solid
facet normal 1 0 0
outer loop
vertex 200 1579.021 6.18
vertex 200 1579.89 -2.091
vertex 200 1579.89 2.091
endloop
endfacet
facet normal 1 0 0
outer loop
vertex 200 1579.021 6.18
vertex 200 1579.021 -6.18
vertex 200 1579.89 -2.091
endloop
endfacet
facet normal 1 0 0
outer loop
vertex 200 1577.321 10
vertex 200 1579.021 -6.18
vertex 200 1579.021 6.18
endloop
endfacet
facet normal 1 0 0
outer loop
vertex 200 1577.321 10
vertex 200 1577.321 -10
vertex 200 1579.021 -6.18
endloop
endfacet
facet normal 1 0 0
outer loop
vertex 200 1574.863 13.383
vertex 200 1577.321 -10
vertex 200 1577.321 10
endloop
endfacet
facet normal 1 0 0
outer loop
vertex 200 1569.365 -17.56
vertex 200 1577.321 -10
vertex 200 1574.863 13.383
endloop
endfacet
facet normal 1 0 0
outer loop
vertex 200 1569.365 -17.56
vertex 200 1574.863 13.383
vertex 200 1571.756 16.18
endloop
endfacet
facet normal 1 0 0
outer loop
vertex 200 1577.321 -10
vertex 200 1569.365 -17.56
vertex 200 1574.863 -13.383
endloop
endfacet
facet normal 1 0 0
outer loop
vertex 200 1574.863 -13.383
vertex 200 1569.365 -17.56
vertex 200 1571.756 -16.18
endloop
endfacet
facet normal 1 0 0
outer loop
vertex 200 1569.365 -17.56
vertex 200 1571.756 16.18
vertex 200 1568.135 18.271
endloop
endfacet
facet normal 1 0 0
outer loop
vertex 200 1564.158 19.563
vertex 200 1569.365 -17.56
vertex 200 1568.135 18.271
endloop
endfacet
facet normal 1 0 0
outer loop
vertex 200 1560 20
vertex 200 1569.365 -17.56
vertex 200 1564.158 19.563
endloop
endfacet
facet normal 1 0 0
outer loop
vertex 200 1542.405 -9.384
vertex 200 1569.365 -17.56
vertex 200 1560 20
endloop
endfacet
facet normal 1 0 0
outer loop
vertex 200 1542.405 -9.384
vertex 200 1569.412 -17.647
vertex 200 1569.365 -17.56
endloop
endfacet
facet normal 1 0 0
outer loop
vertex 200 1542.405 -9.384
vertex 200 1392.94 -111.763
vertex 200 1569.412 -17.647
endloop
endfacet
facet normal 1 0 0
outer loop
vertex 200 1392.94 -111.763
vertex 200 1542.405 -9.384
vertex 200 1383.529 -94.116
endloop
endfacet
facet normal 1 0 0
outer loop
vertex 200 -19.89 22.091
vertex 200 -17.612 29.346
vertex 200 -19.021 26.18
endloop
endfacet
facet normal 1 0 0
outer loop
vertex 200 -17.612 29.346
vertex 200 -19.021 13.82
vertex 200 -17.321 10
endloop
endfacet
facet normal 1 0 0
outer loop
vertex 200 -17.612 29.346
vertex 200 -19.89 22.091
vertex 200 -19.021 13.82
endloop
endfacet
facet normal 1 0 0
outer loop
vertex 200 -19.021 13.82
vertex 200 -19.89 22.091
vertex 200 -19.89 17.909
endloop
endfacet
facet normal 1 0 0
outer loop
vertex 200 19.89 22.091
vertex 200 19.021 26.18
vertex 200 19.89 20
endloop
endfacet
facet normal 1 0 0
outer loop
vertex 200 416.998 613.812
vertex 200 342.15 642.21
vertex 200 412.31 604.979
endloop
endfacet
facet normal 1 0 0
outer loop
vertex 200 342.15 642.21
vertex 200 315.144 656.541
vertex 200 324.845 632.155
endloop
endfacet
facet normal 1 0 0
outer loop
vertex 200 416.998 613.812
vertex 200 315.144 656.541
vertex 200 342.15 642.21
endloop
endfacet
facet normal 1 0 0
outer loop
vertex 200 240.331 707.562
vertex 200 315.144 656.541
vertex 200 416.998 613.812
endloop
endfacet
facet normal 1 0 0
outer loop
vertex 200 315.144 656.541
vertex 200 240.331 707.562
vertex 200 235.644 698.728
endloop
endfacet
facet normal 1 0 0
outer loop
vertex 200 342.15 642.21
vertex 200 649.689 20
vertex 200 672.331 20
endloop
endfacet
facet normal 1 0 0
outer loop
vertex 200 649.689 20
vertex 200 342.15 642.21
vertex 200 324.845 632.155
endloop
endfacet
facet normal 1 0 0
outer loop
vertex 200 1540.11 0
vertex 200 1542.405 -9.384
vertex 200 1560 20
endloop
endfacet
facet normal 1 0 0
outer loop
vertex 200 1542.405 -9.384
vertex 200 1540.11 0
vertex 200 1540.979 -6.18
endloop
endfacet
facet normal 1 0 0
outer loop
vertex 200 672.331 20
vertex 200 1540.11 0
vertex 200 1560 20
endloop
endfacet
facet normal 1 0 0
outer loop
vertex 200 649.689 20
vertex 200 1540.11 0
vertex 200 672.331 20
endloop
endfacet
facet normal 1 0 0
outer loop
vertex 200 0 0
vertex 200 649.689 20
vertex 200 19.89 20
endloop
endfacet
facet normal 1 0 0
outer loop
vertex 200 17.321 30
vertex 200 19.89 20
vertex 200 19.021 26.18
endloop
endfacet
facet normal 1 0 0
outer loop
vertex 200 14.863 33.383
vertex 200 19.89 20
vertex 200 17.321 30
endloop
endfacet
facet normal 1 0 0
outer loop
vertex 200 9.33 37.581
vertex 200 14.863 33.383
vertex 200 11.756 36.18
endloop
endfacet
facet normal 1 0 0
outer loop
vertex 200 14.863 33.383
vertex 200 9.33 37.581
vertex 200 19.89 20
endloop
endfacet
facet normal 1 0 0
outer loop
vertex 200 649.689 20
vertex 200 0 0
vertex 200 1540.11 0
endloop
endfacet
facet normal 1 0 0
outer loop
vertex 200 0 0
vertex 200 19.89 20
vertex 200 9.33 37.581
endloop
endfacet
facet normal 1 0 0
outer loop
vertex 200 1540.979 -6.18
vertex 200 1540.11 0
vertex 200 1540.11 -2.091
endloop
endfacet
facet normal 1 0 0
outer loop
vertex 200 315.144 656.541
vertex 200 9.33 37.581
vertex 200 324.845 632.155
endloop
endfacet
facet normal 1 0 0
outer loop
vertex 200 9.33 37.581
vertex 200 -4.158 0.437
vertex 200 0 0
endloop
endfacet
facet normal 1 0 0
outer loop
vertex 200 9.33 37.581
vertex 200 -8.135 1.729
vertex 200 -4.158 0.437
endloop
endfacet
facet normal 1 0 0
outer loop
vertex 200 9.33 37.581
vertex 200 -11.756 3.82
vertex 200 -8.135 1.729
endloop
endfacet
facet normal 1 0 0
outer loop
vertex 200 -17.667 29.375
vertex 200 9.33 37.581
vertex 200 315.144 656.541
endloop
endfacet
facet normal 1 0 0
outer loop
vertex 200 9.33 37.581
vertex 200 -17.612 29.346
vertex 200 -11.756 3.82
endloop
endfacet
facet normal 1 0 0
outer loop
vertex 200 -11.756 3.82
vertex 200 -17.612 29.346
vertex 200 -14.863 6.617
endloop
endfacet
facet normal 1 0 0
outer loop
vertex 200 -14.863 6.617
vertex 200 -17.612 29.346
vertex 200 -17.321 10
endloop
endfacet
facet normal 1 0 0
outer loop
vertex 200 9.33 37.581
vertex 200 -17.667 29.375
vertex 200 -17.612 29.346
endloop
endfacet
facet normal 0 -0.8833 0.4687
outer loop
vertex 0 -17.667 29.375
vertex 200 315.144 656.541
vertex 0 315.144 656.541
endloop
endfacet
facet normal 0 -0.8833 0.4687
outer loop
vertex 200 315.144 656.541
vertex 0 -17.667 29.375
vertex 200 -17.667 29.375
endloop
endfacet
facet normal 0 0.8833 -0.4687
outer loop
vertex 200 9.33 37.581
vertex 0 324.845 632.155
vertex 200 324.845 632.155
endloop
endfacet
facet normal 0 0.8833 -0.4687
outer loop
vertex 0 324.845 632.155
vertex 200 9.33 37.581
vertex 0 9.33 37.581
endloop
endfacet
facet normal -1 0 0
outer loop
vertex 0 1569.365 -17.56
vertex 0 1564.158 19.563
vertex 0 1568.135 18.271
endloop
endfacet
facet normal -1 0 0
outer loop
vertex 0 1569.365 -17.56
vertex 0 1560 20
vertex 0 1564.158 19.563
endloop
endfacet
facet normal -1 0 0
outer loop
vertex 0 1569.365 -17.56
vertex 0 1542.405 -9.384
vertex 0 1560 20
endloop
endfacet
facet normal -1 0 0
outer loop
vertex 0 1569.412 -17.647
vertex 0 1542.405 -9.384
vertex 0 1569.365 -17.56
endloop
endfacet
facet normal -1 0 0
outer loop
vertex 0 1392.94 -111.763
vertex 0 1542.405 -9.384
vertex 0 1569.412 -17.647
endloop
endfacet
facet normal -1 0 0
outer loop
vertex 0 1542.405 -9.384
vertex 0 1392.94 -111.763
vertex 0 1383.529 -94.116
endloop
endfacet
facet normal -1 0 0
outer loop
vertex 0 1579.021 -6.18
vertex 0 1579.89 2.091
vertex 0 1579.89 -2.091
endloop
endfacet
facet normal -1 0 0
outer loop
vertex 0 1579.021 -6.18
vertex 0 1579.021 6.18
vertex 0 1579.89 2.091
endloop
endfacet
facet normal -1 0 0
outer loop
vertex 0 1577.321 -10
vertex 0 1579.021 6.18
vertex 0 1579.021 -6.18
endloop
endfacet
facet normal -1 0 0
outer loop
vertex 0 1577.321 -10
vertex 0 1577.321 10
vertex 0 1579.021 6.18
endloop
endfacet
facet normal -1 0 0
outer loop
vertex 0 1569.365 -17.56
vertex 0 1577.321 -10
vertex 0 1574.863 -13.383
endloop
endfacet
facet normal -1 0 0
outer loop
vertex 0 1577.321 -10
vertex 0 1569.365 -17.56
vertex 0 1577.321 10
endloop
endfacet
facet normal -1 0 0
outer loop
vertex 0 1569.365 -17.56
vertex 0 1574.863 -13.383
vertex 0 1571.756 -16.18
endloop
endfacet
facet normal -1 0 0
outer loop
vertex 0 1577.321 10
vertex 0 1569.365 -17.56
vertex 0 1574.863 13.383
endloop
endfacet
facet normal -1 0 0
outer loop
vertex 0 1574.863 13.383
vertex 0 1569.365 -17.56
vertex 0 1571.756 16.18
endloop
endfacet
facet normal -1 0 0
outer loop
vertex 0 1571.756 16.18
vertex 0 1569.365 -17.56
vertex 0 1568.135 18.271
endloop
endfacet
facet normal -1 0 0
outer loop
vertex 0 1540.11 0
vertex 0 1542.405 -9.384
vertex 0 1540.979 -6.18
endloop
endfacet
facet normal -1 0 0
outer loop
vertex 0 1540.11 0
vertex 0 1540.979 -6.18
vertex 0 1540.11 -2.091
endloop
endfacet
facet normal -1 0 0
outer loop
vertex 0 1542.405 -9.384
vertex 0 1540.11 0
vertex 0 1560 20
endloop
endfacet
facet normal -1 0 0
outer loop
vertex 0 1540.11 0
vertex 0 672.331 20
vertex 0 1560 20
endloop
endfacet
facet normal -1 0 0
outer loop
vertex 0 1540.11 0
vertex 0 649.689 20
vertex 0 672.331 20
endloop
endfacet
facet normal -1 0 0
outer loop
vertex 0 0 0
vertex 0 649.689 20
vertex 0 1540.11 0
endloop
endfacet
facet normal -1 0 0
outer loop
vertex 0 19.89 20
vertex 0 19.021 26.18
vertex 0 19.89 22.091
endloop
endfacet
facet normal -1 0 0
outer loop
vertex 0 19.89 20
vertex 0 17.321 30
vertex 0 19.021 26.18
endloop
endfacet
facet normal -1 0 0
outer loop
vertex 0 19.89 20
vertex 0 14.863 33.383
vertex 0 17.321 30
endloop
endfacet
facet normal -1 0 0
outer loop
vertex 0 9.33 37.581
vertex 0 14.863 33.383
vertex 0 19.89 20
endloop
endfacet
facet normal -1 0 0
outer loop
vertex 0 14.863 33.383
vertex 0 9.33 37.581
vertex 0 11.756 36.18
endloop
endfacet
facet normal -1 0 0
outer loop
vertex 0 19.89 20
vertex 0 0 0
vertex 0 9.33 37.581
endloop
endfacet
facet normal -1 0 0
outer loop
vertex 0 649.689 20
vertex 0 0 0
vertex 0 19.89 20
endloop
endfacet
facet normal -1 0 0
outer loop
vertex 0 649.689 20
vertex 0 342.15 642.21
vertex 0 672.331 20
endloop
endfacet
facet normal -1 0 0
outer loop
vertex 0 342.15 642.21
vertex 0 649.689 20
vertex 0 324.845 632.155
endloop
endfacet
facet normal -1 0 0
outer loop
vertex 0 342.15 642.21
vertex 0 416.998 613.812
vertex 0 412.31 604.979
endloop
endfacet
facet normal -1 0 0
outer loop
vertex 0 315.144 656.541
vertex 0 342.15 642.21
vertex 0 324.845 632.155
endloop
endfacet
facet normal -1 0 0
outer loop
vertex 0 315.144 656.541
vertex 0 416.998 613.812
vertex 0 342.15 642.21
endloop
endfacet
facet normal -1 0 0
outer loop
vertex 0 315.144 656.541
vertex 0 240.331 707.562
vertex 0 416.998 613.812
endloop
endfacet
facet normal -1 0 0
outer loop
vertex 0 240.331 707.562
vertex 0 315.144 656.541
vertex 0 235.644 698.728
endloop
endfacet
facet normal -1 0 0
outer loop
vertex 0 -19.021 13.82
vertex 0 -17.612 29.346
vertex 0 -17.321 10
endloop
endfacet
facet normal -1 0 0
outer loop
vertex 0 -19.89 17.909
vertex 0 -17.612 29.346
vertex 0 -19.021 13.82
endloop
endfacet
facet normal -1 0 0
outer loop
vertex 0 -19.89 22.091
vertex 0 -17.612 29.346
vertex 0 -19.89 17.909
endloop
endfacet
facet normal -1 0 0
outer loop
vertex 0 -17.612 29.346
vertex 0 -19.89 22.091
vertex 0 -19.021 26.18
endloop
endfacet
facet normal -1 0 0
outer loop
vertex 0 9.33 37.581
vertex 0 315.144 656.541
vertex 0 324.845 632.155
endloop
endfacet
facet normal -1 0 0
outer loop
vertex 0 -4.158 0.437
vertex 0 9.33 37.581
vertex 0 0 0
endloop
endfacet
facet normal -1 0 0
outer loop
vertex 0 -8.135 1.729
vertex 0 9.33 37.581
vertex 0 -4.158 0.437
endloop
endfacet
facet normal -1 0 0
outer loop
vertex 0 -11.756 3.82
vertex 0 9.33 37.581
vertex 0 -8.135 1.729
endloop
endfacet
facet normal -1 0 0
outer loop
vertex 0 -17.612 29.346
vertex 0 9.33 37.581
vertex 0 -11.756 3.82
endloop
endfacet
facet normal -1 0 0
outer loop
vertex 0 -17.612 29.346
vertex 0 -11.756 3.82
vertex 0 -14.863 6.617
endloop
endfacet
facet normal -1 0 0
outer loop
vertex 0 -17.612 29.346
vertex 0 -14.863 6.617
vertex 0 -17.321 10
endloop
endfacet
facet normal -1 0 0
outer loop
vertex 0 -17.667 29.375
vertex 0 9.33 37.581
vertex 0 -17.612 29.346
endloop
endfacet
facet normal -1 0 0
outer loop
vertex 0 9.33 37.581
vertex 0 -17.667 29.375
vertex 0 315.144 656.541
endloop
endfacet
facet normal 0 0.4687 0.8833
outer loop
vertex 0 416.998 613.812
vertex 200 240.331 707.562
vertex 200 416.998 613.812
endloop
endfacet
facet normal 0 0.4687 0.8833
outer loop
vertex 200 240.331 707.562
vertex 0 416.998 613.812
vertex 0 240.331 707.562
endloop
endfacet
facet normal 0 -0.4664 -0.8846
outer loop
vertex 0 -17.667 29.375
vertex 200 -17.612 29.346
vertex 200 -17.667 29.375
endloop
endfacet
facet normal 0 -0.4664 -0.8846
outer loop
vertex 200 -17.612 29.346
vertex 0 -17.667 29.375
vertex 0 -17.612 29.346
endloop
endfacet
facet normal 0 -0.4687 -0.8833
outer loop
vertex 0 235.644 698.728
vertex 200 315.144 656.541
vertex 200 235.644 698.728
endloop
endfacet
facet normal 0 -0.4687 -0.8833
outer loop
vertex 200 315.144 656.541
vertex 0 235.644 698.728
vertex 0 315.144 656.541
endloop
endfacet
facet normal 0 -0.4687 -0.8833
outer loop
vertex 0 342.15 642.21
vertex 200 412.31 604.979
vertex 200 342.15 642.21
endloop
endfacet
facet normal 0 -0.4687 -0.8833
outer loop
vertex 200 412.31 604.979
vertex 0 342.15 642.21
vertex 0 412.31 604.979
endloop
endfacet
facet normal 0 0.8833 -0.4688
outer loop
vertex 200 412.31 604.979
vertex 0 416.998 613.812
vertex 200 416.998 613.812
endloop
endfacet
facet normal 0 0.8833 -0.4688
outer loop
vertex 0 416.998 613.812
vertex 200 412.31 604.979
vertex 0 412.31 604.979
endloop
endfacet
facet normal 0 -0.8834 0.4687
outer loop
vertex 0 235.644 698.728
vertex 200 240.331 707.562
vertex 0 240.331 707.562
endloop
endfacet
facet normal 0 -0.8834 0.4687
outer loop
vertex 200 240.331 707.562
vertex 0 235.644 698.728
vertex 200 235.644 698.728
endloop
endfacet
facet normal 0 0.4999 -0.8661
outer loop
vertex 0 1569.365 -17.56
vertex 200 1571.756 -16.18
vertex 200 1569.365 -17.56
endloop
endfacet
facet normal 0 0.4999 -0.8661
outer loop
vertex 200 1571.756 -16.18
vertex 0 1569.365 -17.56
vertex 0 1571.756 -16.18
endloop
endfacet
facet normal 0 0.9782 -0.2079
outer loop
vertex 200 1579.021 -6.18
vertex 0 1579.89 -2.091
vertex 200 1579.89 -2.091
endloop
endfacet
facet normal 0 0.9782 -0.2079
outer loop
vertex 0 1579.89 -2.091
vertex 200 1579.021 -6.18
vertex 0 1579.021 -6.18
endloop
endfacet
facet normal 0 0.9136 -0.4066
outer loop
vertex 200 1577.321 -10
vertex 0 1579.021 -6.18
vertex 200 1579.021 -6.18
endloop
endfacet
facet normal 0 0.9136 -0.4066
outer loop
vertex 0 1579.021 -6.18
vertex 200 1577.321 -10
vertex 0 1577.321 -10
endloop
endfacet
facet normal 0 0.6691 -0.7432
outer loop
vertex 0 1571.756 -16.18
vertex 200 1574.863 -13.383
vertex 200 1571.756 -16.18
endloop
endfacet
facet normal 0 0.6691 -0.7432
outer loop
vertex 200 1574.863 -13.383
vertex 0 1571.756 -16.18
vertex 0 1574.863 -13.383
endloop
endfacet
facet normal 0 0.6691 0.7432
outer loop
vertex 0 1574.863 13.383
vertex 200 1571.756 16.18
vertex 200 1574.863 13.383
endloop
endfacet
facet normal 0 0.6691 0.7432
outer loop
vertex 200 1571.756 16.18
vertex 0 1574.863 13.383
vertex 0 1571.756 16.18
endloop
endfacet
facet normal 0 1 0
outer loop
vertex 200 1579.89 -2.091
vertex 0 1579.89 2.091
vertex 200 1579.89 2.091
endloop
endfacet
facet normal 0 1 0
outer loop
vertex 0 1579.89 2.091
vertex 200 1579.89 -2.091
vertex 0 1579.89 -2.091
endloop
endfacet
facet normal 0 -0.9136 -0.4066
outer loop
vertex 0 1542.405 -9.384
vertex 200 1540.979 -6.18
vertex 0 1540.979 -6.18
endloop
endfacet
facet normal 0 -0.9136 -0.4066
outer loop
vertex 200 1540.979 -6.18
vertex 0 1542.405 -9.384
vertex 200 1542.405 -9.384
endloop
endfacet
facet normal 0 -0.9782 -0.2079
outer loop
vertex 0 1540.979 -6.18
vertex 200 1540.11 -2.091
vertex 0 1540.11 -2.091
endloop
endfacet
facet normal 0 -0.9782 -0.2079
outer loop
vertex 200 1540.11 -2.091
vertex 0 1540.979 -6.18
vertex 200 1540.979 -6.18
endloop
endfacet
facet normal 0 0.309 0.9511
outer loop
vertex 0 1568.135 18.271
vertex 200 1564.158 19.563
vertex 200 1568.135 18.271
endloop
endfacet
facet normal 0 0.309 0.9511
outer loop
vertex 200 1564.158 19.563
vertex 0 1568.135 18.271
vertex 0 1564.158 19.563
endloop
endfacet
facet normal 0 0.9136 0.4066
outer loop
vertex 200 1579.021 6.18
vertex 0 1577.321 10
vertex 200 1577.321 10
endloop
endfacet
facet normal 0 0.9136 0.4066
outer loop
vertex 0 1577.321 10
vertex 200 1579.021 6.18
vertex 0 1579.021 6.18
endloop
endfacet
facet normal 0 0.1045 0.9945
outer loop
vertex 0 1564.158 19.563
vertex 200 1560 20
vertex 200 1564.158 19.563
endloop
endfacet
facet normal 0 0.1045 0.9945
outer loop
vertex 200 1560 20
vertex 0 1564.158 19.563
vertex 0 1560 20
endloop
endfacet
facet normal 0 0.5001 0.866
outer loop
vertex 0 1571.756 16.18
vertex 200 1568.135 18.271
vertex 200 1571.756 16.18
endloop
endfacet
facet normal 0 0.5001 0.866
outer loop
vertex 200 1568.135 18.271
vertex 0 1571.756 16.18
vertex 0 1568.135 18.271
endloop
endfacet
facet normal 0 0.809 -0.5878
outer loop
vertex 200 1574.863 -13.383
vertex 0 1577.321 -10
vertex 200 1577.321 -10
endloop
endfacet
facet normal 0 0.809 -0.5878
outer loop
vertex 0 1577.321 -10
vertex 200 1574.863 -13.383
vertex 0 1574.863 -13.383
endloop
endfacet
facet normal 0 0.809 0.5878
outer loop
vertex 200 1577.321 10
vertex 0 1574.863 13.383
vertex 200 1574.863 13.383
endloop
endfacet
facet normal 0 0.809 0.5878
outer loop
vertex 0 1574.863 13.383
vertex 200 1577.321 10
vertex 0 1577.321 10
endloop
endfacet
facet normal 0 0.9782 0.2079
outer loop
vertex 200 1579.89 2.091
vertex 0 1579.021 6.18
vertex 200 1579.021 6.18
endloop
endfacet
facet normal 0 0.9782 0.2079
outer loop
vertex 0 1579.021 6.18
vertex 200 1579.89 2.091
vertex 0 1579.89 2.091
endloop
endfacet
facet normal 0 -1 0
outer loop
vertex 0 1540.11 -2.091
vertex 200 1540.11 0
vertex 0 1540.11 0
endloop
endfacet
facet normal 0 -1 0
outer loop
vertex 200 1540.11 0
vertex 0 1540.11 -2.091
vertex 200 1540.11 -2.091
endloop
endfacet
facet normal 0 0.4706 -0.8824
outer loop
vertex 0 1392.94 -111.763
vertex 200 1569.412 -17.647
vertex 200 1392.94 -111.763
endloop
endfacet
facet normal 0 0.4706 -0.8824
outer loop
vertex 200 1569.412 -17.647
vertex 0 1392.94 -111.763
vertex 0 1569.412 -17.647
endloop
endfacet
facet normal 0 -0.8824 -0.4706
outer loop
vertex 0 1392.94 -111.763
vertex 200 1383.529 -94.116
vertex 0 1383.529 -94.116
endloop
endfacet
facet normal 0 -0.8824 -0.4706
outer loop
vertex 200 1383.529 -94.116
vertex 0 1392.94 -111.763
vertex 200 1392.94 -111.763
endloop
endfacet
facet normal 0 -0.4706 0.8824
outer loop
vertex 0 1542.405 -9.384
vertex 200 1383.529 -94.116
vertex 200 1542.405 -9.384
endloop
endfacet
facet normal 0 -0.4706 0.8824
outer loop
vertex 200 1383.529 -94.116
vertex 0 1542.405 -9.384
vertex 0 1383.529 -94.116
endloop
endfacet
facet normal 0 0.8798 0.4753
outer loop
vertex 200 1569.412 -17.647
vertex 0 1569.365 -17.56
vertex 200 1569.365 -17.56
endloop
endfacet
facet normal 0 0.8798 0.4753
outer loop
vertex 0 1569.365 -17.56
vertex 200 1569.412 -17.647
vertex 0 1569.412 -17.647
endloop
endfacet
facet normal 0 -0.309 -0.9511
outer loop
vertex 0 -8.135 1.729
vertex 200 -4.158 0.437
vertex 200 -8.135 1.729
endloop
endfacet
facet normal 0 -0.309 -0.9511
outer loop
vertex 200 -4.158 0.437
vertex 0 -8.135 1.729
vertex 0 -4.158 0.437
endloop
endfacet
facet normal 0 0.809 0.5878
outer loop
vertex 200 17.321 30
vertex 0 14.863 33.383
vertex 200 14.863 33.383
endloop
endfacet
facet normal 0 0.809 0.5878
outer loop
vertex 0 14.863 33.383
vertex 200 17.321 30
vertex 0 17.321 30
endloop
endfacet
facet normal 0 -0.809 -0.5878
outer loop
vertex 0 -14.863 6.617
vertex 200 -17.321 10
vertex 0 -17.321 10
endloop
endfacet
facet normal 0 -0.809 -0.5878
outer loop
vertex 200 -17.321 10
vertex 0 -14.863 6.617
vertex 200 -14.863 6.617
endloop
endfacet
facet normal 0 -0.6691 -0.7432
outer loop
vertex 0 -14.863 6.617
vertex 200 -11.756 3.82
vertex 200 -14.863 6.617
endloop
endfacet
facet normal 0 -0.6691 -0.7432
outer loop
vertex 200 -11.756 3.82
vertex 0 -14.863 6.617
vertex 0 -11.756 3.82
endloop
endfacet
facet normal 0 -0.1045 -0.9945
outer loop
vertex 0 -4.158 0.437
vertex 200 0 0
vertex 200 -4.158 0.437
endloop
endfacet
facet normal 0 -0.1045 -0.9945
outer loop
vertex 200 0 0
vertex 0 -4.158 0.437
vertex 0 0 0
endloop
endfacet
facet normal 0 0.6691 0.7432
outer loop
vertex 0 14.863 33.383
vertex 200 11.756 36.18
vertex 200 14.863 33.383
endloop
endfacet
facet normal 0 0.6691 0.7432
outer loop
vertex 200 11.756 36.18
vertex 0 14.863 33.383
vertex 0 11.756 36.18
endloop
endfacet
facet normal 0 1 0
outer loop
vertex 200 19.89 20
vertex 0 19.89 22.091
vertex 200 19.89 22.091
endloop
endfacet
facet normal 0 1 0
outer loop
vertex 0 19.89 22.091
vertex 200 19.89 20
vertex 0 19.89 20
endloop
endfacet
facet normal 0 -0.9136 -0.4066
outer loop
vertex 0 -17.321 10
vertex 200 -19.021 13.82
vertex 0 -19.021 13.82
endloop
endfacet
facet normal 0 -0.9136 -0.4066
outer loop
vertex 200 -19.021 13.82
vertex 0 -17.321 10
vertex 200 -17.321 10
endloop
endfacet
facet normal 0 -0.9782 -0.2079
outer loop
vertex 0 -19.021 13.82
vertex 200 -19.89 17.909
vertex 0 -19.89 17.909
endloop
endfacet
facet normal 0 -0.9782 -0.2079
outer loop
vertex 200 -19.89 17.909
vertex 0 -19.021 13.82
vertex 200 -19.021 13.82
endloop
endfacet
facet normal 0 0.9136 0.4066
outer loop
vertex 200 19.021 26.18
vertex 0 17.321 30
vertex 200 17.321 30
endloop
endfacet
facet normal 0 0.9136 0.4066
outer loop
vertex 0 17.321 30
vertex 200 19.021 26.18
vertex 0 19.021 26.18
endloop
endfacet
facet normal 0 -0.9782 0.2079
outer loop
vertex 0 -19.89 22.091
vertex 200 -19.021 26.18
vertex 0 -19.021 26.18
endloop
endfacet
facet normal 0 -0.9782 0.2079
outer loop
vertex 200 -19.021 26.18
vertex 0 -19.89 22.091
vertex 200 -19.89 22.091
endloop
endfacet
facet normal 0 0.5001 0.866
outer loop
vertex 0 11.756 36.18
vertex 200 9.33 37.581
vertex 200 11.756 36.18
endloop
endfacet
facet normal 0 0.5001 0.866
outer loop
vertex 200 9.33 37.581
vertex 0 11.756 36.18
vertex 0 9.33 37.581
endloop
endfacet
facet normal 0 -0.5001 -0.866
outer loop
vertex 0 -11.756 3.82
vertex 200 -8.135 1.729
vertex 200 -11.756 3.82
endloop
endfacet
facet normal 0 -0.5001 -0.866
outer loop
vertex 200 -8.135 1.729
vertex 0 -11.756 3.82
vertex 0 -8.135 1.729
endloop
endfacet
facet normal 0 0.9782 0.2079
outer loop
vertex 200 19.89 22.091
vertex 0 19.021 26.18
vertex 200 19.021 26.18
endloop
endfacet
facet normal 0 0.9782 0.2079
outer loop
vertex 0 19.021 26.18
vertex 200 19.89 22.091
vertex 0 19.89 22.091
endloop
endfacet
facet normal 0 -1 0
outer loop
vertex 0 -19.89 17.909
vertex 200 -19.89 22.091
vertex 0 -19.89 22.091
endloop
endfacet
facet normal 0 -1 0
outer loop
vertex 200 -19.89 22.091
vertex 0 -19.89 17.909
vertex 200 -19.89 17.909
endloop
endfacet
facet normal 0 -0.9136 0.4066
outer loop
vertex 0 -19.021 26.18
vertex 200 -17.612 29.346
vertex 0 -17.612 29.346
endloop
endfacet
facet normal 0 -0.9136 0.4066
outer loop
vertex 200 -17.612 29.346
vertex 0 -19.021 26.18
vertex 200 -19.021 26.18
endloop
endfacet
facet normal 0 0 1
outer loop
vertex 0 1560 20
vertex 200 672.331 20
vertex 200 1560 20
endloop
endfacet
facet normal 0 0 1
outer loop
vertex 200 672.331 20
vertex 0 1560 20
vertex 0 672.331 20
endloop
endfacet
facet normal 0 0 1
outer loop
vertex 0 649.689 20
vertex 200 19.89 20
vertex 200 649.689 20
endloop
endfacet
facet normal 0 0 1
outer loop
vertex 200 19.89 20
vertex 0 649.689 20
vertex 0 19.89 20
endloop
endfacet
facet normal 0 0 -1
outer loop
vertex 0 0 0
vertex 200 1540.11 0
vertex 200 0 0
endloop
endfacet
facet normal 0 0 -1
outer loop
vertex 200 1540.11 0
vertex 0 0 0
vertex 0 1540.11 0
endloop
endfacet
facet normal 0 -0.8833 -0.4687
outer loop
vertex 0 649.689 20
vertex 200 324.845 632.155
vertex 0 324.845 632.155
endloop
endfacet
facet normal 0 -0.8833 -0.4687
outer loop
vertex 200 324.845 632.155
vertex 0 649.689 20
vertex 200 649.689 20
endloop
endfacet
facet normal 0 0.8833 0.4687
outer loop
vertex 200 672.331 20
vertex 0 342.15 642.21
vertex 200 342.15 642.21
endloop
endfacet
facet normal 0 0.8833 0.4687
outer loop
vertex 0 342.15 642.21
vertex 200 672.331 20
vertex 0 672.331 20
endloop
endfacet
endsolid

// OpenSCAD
// 20mm
width = 200;

// print thickness 2mm
thickness=20;

// Height of the plant-pot 160mm minus the rounded corners with a radius of print thickness
height = 1600 - thickness * 2;


// 2mm
support_pad_size = 200;
// 1mm
support_pad_thickness = 10;
// The support length (wall to plant pot)
suppportLength = 750 - (thickness + support_pad_thickness);

// Support angle
angle=62.047;

module rounded_corner(move_up = false) {
  translate(v = [0, 0, move_up ? 0 : thickness]) {
    rotate(a = 90, v = [0, 1, 0]) {
      cylinder(h = width, r = thickness);
    }
  }
}

module support() {
  cube(size = [width, suppportLength, thickness]);

  translate(v = [0, suppportLength, (-support_pad_size + thickness) / 2]) {
    rotate(a = 90, v = [1, 0, 0]) {
      cube(size = [width, support_pad_size, support_pad_thickness]);
    }
  }
}


module beam() {
  // Right angle triangle calculations
  c = suppportLength;
  b = c * sin(angle);
  a = sqrt(pow(c, 2) - pow(b, 2));

  translate(v = [0, a - thickness, b + thickness / 2]) {
    rotate(a = -angle, v = [1, 0, 0]) {
      cube(size = [width, c + thickness / 2, thickness]);
    }
  }
}

// TODO - Make a rounder more elegant latch
module latch() {
  translate(v = [0, height, 0]) {
    rounded_corner(true);
    rotate(a = 180 + 28.072, v = [1, 0, 0]) {
      cube(size = [width, width, thickness]);
    }
  }
}


// Part running next to Planter
rounded_corner();
cube([width, height, thickness]);

// Wall Support
translate(v = [0, 0, thickness]) {
  rotate(a = angle, v = [1, 0, 0]) {
    support();
  }
}

// Beam for more sturdyness
beam();

// Latch that hooks on to planter
latch();
